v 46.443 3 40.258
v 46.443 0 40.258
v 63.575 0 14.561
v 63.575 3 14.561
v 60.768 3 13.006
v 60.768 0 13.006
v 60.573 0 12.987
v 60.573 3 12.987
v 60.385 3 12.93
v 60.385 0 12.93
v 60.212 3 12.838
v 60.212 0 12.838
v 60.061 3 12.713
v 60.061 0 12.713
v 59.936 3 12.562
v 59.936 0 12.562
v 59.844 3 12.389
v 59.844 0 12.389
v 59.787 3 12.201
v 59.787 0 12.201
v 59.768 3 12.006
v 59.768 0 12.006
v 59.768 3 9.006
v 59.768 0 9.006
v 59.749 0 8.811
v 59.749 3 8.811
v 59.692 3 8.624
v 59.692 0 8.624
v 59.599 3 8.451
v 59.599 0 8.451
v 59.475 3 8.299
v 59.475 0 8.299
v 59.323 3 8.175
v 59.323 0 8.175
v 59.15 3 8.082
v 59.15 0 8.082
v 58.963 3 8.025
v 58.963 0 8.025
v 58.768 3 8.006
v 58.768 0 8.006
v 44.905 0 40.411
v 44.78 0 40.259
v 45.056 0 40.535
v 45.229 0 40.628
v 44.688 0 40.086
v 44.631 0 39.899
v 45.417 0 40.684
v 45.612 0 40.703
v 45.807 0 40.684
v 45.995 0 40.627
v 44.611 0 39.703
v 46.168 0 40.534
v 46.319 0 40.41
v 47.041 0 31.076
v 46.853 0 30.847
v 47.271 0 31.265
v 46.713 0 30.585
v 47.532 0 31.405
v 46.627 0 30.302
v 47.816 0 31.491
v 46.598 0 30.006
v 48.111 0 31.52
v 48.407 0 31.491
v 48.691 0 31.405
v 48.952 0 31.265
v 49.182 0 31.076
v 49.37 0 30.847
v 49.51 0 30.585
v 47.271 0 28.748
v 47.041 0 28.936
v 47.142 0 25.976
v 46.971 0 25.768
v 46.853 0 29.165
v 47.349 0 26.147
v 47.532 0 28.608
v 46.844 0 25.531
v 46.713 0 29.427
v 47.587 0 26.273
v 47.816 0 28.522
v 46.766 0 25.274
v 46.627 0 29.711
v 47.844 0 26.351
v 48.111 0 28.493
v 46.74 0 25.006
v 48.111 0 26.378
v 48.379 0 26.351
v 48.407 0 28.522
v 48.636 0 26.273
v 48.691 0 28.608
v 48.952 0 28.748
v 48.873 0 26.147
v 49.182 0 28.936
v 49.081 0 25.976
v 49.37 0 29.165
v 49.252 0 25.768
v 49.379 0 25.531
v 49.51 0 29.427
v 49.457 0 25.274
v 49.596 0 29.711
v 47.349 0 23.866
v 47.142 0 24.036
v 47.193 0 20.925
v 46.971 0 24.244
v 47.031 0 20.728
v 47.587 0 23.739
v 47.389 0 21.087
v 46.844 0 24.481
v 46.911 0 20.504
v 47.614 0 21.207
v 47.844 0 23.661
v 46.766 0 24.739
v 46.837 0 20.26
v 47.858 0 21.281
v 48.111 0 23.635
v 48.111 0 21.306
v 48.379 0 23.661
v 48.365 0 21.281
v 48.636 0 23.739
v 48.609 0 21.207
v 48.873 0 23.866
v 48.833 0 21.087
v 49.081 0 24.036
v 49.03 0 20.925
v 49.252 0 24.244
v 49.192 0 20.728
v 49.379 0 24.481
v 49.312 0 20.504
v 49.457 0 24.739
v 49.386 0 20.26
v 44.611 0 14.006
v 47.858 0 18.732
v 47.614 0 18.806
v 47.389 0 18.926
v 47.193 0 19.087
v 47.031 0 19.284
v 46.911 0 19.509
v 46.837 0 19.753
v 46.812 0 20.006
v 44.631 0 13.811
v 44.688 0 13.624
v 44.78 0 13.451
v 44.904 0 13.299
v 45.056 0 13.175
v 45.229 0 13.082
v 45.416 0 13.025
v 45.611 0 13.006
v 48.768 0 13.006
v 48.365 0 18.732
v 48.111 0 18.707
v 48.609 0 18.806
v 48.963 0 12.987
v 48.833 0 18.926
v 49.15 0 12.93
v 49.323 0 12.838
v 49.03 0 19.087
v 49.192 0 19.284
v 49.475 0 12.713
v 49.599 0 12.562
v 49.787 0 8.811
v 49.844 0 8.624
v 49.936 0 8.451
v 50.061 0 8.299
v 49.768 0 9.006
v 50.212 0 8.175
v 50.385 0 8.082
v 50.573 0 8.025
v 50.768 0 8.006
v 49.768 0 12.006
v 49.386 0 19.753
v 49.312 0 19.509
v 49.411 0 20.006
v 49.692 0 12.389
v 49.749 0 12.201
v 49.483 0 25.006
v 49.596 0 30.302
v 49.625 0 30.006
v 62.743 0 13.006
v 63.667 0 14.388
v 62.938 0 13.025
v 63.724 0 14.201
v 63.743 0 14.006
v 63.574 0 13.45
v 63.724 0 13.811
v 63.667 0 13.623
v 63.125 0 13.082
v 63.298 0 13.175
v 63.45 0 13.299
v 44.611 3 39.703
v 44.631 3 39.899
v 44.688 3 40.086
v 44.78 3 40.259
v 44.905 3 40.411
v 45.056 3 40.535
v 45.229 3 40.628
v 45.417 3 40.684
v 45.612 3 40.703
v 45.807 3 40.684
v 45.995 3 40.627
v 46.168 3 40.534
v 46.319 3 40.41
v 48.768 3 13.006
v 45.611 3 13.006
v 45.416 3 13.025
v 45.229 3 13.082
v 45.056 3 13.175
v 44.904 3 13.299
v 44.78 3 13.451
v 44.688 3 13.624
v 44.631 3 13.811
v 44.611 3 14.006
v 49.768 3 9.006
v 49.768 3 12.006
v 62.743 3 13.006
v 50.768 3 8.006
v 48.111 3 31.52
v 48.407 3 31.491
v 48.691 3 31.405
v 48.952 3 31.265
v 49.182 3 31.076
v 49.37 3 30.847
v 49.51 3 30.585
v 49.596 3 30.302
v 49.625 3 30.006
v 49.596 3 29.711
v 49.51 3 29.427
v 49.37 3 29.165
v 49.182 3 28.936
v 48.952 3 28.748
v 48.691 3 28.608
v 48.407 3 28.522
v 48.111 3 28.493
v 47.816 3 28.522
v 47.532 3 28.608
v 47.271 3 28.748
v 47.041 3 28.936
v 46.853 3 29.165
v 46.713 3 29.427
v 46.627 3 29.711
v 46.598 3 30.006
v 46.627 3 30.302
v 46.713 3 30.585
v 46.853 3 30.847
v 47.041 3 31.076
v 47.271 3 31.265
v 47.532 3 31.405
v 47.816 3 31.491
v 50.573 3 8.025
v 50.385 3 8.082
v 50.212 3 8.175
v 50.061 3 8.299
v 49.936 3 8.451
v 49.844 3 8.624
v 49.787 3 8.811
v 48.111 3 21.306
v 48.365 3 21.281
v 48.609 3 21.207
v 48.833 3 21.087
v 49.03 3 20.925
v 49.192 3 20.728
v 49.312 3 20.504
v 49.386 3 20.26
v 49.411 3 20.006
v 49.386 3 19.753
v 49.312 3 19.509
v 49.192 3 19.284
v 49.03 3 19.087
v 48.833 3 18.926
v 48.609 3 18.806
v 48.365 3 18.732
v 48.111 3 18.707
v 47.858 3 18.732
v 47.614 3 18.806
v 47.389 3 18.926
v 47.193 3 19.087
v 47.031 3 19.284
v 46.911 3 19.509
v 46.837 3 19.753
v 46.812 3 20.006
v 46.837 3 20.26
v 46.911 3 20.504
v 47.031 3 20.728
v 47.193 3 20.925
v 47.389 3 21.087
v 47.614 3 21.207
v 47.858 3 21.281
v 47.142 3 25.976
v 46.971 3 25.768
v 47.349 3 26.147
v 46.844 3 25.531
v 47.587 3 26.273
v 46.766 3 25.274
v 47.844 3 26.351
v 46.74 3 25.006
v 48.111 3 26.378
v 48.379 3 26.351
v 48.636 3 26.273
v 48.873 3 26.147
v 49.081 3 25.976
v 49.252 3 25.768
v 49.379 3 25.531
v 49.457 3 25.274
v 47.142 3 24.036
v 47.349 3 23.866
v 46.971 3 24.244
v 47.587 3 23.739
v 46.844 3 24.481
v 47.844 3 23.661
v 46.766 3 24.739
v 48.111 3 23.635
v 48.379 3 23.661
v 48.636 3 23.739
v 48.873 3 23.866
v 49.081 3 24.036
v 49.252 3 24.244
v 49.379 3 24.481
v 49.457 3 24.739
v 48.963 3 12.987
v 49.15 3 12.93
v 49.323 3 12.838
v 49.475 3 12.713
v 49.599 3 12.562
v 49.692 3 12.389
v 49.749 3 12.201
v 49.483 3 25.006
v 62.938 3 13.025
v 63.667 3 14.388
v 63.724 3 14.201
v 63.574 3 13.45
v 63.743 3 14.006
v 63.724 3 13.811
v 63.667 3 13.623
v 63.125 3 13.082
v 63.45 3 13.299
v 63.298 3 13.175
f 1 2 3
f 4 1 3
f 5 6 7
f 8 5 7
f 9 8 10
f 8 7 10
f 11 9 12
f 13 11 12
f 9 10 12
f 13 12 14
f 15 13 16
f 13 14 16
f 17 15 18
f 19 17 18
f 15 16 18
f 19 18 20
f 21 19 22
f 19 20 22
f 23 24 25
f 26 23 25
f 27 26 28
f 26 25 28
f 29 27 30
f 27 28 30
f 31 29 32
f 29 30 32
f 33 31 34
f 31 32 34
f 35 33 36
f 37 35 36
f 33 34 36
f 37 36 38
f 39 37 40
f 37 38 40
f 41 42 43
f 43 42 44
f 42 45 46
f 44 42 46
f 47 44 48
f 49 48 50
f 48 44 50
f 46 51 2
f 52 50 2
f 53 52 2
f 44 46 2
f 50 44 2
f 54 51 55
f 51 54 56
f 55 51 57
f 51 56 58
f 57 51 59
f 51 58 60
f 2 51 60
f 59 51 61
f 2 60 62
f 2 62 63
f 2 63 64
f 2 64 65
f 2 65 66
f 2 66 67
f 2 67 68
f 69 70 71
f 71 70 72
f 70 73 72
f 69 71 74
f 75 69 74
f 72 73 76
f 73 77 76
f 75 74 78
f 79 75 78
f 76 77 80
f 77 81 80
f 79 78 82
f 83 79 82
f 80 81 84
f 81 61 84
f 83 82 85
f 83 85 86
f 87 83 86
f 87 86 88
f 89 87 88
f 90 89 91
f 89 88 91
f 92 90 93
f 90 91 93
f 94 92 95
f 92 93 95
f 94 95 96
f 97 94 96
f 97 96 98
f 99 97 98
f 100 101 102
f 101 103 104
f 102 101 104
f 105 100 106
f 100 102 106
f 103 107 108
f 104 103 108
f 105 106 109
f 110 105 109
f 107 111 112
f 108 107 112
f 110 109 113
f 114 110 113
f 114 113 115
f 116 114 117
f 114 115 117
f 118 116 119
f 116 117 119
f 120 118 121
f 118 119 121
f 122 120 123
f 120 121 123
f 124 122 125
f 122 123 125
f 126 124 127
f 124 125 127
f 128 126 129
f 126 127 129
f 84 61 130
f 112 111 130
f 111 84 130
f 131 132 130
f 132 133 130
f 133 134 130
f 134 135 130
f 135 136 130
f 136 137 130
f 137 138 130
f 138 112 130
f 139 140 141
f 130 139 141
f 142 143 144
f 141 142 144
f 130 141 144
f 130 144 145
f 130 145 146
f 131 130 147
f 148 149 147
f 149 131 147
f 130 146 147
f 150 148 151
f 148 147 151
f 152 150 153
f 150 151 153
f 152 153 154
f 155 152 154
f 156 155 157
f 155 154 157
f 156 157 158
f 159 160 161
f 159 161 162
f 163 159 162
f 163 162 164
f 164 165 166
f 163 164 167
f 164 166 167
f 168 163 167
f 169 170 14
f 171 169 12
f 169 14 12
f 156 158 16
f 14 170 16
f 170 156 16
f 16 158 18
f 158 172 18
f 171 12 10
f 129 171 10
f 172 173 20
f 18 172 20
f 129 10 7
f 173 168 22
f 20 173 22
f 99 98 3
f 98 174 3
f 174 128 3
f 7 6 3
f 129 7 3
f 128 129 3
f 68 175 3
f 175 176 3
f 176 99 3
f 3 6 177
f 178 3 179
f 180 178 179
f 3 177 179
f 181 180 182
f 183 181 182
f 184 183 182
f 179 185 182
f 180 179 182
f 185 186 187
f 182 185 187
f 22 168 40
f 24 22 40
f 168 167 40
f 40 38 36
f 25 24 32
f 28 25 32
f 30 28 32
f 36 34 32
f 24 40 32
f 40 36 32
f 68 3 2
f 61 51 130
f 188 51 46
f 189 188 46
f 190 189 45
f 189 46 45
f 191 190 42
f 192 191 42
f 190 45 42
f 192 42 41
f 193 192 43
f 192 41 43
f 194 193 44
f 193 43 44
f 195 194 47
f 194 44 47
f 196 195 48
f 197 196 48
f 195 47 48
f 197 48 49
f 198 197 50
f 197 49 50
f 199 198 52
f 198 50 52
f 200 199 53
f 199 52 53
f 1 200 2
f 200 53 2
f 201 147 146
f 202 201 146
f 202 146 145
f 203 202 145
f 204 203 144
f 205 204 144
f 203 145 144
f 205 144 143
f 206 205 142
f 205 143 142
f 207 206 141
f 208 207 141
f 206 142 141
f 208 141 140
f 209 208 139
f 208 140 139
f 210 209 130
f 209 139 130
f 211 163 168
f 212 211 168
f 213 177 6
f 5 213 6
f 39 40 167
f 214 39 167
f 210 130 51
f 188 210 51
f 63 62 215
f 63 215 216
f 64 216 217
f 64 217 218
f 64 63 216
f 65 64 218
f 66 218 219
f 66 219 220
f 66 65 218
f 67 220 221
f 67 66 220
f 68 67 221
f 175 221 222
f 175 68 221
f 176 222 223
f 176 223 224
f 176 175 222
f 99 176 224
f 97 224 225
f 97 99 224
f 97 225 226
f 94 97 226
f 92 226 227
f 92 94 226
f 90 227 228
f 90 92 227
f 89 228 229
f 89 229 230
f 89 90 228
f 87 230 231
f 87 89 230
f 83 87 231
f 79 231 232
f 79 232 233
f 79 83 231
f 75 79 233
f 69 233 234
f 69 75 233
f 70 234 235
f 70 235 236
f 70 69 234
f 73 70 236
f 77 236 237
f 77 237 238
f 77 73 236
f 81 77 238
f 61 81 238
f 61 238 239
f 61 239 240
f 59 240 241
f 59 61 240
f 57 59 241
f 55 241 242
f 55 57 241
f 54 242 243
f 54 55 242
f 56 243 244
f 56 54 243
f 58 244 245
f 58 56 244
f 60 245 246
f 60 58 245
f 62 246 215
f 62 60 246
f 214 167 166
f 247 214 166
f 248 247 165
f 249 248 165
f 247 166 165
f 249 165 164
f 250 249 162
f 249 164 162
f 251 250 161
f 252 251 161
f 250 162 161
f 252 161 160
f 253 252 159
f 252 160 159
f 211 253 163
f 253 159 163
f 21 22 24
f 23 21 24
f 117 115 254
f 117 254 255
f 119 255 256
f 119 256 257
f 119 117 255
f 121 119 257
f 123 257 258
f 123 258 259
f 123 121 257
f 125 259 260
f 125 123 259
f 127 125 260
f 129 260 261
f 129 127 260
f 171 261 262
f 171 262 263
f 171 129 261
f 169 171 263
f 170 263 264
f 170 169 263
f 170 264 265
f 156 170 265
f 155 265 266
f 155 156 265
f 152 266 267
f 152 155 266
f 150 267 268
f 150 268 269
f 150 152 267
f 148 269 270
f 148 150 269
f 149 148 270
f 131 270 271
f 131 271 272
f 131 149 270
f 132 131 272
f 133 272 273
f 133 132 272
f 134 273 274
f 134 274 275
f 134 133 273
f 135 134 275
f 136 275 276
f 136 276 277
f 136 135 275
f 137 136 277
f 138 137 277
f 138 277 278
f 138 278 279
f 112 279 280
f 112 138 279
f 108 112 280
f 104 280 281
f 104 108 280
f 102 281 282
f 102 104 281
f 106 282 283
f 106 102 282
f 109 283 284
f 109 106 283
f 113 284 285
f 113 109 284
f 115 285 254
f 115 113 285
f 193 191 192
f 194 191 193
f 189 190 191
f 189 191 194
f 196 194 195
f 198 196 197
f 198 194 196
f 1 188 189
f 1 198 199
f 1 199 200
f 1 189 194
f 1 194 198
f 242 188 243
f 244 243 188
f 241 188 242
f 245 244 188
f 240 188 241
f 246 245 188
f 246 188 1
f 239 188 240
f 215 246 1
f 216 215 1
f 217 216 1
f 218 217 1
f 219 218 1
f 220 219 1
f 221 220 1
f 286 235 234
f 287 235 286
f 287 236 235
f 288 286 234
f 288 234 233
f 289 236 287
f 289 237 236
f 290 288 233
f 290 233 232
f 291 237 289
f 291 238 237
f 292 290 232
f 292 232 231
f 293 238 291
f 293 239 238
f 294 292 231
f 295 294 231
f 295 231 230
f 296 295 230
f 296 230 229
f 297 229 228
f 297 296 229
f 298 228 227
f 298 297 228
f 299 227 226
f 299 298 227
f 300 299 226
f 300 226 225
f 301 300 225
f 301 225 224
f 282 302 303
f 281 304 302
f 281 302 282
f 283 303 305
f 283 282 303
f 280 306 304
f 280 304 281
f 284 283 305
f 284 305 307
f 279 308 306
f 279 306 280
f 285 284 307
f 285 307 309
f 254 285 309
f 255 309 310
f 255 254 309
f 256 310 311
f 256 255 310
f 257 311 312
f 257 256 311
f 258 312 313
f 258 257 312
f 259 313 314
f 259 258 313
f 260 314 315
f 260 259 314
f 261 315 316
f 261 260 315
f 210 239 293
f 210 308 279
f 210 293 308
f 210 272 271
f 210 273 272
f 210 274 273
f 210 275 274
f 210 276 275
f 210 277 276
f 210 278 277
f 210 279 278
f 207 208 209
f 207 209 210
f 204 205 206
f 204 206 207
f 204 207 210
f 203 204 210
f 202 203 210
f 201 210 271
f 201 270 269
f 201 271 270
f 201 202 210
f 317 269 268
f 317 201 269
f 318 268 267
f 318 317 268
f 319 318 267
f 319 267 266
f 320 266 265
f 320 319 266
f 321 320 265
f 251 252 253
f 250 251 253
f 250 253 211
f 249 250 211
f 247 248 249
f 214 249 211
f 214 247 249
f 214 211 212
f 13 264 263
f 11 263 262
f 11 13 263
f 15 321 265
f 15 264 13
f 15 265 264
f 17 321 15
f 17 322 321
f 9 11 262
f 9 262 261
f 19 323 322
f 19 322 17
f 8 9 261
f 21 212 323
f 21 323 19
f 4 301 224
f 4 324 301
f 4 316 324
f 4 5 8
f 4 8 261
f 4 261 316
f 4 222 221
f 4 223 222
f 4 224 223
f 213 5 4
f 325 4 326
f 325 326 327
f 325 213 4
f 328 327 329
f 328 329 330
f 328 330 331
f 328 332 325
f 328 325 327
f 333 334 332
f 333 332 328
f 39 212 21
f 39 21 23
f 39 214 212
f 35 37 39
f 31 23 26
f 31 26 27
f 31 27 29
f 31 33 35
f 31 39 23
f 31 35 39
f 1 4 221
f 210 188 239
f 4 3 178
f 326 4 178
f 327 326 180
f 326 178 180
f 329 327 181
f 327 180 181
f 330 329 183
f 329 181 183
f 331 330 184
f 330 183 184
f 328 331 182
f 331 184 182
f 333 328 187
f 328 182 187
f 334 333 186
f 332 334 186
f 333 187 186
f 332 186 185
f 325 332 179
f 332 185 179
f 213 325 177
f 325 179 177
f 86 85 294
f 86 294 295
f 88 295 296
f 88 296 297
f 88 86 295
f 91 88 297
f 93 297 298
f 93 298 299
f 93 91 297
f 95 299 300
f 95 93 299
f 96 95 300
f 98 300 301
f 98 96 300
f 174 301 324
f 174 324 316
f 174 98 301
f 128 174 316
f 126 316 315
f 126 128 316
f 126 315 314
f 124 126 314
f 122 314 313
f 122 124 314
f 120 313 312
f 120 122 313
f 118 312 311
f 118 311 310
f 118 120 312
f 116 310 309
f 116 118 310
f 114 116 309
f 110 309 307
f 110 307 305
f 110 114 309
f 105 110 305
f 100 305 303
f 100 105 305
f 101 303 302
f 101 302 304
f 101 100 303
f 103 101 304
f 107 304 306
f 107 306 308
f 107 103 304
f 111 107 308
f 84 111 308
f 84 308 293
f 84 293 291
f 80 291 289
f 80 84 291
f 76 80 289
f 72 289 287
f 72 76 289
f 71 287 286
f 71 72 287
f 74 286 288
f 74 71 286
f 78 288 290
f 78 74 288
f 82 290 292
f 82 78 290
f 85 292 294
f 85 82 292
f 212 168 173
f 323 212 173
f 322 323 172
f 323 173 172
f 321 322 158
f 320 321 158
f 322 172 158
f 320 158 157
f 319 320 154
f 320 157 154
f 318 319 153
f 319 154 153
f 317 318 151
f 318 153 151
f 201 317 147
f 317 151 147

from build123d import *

# Parameters (mm, degrees)
SKETCH1_R           = 1.513481749
SKETCH1_R_2         = 1.371491644
SKETCH1_R_3         = 1.299503913
BOSS_EXTRUDE1_DEPTH = 3


with BuildPart() as part:
    # Sketch1 → Boss-Extrude1 (new body)
    with BuildSketch(Plane(origin=(0, 0, 0), x_dir=(1, 0, 0), z_dir=(0, 1, 0))):
        with BuildLine():
            Line((46.443482118, -40.25819894), (63.574965027, -14.560974577))
            ThreePointArc((63.574965027, -14.560974577), (63.624589331, -13.534416456), (62.742914732, -13.006274381))
            Line((62.742914732, -13.006274381), (60.767784216, -13.006274381))
            ThreePointArc((60.767784216, -13.006274381), (60.060677435, -12.713381162), (59.767784216, -12.006274381))
            Line((59.767784216, -12.006274381), (59.767784216, -9.006274381))
            ThreePointArc((59.767784216, -9.006274381), (59.474890998, -8.2991676), (58.767784216, -8.006274381))
            Line((58.767784216, -8.006274381), (50.767784216, -8.006274381))
            ThreePointArc((50.767784216, -8.006274381), (50.060677435, -8.2991676), (49.767784216, -9.006274381))
            Line((49.767784216, -9.006274381), (49.767784216, -12.006274381))
            ThreePointArc((49.767784216, -12.006274381), (49.474890998, -12.713381162), (48.767784216, -13.006274381))
            Line((48.767784216, -13.006274381), (45.611431824, -13.006274381))
            ThreePointArc((45.611431824, -13.006274381), (44.904325043, -13.2991676), (44.611431824, -14.006274381))
            Line((44.611431824, -14.006274381), (44.611431824, -39.703498743))
            ThreePointArc((44.611431824, -39.703498743), (45.321647675, -40.66059077), (46.443482118, -40.25819894))
        make_face()
        with Locations(Location((48.111431824, -30.006274381, 0), (0, 0, 270))):
            Circle(SKETCH1_R, mode=Mode.SUBTRACT)
        with Locations(Location((48.111431824, -25.006274381, 0), (0, 0, 270))):
            Circle(SKETCH1_R_2, mode=Mode.SUBTRACT)
        with Locations(Location((48.111431824, -20.006274381, 0), (0, 0, 270))):
            Circle(SKETCH1_R_3, mode=Mode.SUBTRACT)
    extrude(amount=BOSS_EXTRUDE1_DEPTH)


solid = part.part
